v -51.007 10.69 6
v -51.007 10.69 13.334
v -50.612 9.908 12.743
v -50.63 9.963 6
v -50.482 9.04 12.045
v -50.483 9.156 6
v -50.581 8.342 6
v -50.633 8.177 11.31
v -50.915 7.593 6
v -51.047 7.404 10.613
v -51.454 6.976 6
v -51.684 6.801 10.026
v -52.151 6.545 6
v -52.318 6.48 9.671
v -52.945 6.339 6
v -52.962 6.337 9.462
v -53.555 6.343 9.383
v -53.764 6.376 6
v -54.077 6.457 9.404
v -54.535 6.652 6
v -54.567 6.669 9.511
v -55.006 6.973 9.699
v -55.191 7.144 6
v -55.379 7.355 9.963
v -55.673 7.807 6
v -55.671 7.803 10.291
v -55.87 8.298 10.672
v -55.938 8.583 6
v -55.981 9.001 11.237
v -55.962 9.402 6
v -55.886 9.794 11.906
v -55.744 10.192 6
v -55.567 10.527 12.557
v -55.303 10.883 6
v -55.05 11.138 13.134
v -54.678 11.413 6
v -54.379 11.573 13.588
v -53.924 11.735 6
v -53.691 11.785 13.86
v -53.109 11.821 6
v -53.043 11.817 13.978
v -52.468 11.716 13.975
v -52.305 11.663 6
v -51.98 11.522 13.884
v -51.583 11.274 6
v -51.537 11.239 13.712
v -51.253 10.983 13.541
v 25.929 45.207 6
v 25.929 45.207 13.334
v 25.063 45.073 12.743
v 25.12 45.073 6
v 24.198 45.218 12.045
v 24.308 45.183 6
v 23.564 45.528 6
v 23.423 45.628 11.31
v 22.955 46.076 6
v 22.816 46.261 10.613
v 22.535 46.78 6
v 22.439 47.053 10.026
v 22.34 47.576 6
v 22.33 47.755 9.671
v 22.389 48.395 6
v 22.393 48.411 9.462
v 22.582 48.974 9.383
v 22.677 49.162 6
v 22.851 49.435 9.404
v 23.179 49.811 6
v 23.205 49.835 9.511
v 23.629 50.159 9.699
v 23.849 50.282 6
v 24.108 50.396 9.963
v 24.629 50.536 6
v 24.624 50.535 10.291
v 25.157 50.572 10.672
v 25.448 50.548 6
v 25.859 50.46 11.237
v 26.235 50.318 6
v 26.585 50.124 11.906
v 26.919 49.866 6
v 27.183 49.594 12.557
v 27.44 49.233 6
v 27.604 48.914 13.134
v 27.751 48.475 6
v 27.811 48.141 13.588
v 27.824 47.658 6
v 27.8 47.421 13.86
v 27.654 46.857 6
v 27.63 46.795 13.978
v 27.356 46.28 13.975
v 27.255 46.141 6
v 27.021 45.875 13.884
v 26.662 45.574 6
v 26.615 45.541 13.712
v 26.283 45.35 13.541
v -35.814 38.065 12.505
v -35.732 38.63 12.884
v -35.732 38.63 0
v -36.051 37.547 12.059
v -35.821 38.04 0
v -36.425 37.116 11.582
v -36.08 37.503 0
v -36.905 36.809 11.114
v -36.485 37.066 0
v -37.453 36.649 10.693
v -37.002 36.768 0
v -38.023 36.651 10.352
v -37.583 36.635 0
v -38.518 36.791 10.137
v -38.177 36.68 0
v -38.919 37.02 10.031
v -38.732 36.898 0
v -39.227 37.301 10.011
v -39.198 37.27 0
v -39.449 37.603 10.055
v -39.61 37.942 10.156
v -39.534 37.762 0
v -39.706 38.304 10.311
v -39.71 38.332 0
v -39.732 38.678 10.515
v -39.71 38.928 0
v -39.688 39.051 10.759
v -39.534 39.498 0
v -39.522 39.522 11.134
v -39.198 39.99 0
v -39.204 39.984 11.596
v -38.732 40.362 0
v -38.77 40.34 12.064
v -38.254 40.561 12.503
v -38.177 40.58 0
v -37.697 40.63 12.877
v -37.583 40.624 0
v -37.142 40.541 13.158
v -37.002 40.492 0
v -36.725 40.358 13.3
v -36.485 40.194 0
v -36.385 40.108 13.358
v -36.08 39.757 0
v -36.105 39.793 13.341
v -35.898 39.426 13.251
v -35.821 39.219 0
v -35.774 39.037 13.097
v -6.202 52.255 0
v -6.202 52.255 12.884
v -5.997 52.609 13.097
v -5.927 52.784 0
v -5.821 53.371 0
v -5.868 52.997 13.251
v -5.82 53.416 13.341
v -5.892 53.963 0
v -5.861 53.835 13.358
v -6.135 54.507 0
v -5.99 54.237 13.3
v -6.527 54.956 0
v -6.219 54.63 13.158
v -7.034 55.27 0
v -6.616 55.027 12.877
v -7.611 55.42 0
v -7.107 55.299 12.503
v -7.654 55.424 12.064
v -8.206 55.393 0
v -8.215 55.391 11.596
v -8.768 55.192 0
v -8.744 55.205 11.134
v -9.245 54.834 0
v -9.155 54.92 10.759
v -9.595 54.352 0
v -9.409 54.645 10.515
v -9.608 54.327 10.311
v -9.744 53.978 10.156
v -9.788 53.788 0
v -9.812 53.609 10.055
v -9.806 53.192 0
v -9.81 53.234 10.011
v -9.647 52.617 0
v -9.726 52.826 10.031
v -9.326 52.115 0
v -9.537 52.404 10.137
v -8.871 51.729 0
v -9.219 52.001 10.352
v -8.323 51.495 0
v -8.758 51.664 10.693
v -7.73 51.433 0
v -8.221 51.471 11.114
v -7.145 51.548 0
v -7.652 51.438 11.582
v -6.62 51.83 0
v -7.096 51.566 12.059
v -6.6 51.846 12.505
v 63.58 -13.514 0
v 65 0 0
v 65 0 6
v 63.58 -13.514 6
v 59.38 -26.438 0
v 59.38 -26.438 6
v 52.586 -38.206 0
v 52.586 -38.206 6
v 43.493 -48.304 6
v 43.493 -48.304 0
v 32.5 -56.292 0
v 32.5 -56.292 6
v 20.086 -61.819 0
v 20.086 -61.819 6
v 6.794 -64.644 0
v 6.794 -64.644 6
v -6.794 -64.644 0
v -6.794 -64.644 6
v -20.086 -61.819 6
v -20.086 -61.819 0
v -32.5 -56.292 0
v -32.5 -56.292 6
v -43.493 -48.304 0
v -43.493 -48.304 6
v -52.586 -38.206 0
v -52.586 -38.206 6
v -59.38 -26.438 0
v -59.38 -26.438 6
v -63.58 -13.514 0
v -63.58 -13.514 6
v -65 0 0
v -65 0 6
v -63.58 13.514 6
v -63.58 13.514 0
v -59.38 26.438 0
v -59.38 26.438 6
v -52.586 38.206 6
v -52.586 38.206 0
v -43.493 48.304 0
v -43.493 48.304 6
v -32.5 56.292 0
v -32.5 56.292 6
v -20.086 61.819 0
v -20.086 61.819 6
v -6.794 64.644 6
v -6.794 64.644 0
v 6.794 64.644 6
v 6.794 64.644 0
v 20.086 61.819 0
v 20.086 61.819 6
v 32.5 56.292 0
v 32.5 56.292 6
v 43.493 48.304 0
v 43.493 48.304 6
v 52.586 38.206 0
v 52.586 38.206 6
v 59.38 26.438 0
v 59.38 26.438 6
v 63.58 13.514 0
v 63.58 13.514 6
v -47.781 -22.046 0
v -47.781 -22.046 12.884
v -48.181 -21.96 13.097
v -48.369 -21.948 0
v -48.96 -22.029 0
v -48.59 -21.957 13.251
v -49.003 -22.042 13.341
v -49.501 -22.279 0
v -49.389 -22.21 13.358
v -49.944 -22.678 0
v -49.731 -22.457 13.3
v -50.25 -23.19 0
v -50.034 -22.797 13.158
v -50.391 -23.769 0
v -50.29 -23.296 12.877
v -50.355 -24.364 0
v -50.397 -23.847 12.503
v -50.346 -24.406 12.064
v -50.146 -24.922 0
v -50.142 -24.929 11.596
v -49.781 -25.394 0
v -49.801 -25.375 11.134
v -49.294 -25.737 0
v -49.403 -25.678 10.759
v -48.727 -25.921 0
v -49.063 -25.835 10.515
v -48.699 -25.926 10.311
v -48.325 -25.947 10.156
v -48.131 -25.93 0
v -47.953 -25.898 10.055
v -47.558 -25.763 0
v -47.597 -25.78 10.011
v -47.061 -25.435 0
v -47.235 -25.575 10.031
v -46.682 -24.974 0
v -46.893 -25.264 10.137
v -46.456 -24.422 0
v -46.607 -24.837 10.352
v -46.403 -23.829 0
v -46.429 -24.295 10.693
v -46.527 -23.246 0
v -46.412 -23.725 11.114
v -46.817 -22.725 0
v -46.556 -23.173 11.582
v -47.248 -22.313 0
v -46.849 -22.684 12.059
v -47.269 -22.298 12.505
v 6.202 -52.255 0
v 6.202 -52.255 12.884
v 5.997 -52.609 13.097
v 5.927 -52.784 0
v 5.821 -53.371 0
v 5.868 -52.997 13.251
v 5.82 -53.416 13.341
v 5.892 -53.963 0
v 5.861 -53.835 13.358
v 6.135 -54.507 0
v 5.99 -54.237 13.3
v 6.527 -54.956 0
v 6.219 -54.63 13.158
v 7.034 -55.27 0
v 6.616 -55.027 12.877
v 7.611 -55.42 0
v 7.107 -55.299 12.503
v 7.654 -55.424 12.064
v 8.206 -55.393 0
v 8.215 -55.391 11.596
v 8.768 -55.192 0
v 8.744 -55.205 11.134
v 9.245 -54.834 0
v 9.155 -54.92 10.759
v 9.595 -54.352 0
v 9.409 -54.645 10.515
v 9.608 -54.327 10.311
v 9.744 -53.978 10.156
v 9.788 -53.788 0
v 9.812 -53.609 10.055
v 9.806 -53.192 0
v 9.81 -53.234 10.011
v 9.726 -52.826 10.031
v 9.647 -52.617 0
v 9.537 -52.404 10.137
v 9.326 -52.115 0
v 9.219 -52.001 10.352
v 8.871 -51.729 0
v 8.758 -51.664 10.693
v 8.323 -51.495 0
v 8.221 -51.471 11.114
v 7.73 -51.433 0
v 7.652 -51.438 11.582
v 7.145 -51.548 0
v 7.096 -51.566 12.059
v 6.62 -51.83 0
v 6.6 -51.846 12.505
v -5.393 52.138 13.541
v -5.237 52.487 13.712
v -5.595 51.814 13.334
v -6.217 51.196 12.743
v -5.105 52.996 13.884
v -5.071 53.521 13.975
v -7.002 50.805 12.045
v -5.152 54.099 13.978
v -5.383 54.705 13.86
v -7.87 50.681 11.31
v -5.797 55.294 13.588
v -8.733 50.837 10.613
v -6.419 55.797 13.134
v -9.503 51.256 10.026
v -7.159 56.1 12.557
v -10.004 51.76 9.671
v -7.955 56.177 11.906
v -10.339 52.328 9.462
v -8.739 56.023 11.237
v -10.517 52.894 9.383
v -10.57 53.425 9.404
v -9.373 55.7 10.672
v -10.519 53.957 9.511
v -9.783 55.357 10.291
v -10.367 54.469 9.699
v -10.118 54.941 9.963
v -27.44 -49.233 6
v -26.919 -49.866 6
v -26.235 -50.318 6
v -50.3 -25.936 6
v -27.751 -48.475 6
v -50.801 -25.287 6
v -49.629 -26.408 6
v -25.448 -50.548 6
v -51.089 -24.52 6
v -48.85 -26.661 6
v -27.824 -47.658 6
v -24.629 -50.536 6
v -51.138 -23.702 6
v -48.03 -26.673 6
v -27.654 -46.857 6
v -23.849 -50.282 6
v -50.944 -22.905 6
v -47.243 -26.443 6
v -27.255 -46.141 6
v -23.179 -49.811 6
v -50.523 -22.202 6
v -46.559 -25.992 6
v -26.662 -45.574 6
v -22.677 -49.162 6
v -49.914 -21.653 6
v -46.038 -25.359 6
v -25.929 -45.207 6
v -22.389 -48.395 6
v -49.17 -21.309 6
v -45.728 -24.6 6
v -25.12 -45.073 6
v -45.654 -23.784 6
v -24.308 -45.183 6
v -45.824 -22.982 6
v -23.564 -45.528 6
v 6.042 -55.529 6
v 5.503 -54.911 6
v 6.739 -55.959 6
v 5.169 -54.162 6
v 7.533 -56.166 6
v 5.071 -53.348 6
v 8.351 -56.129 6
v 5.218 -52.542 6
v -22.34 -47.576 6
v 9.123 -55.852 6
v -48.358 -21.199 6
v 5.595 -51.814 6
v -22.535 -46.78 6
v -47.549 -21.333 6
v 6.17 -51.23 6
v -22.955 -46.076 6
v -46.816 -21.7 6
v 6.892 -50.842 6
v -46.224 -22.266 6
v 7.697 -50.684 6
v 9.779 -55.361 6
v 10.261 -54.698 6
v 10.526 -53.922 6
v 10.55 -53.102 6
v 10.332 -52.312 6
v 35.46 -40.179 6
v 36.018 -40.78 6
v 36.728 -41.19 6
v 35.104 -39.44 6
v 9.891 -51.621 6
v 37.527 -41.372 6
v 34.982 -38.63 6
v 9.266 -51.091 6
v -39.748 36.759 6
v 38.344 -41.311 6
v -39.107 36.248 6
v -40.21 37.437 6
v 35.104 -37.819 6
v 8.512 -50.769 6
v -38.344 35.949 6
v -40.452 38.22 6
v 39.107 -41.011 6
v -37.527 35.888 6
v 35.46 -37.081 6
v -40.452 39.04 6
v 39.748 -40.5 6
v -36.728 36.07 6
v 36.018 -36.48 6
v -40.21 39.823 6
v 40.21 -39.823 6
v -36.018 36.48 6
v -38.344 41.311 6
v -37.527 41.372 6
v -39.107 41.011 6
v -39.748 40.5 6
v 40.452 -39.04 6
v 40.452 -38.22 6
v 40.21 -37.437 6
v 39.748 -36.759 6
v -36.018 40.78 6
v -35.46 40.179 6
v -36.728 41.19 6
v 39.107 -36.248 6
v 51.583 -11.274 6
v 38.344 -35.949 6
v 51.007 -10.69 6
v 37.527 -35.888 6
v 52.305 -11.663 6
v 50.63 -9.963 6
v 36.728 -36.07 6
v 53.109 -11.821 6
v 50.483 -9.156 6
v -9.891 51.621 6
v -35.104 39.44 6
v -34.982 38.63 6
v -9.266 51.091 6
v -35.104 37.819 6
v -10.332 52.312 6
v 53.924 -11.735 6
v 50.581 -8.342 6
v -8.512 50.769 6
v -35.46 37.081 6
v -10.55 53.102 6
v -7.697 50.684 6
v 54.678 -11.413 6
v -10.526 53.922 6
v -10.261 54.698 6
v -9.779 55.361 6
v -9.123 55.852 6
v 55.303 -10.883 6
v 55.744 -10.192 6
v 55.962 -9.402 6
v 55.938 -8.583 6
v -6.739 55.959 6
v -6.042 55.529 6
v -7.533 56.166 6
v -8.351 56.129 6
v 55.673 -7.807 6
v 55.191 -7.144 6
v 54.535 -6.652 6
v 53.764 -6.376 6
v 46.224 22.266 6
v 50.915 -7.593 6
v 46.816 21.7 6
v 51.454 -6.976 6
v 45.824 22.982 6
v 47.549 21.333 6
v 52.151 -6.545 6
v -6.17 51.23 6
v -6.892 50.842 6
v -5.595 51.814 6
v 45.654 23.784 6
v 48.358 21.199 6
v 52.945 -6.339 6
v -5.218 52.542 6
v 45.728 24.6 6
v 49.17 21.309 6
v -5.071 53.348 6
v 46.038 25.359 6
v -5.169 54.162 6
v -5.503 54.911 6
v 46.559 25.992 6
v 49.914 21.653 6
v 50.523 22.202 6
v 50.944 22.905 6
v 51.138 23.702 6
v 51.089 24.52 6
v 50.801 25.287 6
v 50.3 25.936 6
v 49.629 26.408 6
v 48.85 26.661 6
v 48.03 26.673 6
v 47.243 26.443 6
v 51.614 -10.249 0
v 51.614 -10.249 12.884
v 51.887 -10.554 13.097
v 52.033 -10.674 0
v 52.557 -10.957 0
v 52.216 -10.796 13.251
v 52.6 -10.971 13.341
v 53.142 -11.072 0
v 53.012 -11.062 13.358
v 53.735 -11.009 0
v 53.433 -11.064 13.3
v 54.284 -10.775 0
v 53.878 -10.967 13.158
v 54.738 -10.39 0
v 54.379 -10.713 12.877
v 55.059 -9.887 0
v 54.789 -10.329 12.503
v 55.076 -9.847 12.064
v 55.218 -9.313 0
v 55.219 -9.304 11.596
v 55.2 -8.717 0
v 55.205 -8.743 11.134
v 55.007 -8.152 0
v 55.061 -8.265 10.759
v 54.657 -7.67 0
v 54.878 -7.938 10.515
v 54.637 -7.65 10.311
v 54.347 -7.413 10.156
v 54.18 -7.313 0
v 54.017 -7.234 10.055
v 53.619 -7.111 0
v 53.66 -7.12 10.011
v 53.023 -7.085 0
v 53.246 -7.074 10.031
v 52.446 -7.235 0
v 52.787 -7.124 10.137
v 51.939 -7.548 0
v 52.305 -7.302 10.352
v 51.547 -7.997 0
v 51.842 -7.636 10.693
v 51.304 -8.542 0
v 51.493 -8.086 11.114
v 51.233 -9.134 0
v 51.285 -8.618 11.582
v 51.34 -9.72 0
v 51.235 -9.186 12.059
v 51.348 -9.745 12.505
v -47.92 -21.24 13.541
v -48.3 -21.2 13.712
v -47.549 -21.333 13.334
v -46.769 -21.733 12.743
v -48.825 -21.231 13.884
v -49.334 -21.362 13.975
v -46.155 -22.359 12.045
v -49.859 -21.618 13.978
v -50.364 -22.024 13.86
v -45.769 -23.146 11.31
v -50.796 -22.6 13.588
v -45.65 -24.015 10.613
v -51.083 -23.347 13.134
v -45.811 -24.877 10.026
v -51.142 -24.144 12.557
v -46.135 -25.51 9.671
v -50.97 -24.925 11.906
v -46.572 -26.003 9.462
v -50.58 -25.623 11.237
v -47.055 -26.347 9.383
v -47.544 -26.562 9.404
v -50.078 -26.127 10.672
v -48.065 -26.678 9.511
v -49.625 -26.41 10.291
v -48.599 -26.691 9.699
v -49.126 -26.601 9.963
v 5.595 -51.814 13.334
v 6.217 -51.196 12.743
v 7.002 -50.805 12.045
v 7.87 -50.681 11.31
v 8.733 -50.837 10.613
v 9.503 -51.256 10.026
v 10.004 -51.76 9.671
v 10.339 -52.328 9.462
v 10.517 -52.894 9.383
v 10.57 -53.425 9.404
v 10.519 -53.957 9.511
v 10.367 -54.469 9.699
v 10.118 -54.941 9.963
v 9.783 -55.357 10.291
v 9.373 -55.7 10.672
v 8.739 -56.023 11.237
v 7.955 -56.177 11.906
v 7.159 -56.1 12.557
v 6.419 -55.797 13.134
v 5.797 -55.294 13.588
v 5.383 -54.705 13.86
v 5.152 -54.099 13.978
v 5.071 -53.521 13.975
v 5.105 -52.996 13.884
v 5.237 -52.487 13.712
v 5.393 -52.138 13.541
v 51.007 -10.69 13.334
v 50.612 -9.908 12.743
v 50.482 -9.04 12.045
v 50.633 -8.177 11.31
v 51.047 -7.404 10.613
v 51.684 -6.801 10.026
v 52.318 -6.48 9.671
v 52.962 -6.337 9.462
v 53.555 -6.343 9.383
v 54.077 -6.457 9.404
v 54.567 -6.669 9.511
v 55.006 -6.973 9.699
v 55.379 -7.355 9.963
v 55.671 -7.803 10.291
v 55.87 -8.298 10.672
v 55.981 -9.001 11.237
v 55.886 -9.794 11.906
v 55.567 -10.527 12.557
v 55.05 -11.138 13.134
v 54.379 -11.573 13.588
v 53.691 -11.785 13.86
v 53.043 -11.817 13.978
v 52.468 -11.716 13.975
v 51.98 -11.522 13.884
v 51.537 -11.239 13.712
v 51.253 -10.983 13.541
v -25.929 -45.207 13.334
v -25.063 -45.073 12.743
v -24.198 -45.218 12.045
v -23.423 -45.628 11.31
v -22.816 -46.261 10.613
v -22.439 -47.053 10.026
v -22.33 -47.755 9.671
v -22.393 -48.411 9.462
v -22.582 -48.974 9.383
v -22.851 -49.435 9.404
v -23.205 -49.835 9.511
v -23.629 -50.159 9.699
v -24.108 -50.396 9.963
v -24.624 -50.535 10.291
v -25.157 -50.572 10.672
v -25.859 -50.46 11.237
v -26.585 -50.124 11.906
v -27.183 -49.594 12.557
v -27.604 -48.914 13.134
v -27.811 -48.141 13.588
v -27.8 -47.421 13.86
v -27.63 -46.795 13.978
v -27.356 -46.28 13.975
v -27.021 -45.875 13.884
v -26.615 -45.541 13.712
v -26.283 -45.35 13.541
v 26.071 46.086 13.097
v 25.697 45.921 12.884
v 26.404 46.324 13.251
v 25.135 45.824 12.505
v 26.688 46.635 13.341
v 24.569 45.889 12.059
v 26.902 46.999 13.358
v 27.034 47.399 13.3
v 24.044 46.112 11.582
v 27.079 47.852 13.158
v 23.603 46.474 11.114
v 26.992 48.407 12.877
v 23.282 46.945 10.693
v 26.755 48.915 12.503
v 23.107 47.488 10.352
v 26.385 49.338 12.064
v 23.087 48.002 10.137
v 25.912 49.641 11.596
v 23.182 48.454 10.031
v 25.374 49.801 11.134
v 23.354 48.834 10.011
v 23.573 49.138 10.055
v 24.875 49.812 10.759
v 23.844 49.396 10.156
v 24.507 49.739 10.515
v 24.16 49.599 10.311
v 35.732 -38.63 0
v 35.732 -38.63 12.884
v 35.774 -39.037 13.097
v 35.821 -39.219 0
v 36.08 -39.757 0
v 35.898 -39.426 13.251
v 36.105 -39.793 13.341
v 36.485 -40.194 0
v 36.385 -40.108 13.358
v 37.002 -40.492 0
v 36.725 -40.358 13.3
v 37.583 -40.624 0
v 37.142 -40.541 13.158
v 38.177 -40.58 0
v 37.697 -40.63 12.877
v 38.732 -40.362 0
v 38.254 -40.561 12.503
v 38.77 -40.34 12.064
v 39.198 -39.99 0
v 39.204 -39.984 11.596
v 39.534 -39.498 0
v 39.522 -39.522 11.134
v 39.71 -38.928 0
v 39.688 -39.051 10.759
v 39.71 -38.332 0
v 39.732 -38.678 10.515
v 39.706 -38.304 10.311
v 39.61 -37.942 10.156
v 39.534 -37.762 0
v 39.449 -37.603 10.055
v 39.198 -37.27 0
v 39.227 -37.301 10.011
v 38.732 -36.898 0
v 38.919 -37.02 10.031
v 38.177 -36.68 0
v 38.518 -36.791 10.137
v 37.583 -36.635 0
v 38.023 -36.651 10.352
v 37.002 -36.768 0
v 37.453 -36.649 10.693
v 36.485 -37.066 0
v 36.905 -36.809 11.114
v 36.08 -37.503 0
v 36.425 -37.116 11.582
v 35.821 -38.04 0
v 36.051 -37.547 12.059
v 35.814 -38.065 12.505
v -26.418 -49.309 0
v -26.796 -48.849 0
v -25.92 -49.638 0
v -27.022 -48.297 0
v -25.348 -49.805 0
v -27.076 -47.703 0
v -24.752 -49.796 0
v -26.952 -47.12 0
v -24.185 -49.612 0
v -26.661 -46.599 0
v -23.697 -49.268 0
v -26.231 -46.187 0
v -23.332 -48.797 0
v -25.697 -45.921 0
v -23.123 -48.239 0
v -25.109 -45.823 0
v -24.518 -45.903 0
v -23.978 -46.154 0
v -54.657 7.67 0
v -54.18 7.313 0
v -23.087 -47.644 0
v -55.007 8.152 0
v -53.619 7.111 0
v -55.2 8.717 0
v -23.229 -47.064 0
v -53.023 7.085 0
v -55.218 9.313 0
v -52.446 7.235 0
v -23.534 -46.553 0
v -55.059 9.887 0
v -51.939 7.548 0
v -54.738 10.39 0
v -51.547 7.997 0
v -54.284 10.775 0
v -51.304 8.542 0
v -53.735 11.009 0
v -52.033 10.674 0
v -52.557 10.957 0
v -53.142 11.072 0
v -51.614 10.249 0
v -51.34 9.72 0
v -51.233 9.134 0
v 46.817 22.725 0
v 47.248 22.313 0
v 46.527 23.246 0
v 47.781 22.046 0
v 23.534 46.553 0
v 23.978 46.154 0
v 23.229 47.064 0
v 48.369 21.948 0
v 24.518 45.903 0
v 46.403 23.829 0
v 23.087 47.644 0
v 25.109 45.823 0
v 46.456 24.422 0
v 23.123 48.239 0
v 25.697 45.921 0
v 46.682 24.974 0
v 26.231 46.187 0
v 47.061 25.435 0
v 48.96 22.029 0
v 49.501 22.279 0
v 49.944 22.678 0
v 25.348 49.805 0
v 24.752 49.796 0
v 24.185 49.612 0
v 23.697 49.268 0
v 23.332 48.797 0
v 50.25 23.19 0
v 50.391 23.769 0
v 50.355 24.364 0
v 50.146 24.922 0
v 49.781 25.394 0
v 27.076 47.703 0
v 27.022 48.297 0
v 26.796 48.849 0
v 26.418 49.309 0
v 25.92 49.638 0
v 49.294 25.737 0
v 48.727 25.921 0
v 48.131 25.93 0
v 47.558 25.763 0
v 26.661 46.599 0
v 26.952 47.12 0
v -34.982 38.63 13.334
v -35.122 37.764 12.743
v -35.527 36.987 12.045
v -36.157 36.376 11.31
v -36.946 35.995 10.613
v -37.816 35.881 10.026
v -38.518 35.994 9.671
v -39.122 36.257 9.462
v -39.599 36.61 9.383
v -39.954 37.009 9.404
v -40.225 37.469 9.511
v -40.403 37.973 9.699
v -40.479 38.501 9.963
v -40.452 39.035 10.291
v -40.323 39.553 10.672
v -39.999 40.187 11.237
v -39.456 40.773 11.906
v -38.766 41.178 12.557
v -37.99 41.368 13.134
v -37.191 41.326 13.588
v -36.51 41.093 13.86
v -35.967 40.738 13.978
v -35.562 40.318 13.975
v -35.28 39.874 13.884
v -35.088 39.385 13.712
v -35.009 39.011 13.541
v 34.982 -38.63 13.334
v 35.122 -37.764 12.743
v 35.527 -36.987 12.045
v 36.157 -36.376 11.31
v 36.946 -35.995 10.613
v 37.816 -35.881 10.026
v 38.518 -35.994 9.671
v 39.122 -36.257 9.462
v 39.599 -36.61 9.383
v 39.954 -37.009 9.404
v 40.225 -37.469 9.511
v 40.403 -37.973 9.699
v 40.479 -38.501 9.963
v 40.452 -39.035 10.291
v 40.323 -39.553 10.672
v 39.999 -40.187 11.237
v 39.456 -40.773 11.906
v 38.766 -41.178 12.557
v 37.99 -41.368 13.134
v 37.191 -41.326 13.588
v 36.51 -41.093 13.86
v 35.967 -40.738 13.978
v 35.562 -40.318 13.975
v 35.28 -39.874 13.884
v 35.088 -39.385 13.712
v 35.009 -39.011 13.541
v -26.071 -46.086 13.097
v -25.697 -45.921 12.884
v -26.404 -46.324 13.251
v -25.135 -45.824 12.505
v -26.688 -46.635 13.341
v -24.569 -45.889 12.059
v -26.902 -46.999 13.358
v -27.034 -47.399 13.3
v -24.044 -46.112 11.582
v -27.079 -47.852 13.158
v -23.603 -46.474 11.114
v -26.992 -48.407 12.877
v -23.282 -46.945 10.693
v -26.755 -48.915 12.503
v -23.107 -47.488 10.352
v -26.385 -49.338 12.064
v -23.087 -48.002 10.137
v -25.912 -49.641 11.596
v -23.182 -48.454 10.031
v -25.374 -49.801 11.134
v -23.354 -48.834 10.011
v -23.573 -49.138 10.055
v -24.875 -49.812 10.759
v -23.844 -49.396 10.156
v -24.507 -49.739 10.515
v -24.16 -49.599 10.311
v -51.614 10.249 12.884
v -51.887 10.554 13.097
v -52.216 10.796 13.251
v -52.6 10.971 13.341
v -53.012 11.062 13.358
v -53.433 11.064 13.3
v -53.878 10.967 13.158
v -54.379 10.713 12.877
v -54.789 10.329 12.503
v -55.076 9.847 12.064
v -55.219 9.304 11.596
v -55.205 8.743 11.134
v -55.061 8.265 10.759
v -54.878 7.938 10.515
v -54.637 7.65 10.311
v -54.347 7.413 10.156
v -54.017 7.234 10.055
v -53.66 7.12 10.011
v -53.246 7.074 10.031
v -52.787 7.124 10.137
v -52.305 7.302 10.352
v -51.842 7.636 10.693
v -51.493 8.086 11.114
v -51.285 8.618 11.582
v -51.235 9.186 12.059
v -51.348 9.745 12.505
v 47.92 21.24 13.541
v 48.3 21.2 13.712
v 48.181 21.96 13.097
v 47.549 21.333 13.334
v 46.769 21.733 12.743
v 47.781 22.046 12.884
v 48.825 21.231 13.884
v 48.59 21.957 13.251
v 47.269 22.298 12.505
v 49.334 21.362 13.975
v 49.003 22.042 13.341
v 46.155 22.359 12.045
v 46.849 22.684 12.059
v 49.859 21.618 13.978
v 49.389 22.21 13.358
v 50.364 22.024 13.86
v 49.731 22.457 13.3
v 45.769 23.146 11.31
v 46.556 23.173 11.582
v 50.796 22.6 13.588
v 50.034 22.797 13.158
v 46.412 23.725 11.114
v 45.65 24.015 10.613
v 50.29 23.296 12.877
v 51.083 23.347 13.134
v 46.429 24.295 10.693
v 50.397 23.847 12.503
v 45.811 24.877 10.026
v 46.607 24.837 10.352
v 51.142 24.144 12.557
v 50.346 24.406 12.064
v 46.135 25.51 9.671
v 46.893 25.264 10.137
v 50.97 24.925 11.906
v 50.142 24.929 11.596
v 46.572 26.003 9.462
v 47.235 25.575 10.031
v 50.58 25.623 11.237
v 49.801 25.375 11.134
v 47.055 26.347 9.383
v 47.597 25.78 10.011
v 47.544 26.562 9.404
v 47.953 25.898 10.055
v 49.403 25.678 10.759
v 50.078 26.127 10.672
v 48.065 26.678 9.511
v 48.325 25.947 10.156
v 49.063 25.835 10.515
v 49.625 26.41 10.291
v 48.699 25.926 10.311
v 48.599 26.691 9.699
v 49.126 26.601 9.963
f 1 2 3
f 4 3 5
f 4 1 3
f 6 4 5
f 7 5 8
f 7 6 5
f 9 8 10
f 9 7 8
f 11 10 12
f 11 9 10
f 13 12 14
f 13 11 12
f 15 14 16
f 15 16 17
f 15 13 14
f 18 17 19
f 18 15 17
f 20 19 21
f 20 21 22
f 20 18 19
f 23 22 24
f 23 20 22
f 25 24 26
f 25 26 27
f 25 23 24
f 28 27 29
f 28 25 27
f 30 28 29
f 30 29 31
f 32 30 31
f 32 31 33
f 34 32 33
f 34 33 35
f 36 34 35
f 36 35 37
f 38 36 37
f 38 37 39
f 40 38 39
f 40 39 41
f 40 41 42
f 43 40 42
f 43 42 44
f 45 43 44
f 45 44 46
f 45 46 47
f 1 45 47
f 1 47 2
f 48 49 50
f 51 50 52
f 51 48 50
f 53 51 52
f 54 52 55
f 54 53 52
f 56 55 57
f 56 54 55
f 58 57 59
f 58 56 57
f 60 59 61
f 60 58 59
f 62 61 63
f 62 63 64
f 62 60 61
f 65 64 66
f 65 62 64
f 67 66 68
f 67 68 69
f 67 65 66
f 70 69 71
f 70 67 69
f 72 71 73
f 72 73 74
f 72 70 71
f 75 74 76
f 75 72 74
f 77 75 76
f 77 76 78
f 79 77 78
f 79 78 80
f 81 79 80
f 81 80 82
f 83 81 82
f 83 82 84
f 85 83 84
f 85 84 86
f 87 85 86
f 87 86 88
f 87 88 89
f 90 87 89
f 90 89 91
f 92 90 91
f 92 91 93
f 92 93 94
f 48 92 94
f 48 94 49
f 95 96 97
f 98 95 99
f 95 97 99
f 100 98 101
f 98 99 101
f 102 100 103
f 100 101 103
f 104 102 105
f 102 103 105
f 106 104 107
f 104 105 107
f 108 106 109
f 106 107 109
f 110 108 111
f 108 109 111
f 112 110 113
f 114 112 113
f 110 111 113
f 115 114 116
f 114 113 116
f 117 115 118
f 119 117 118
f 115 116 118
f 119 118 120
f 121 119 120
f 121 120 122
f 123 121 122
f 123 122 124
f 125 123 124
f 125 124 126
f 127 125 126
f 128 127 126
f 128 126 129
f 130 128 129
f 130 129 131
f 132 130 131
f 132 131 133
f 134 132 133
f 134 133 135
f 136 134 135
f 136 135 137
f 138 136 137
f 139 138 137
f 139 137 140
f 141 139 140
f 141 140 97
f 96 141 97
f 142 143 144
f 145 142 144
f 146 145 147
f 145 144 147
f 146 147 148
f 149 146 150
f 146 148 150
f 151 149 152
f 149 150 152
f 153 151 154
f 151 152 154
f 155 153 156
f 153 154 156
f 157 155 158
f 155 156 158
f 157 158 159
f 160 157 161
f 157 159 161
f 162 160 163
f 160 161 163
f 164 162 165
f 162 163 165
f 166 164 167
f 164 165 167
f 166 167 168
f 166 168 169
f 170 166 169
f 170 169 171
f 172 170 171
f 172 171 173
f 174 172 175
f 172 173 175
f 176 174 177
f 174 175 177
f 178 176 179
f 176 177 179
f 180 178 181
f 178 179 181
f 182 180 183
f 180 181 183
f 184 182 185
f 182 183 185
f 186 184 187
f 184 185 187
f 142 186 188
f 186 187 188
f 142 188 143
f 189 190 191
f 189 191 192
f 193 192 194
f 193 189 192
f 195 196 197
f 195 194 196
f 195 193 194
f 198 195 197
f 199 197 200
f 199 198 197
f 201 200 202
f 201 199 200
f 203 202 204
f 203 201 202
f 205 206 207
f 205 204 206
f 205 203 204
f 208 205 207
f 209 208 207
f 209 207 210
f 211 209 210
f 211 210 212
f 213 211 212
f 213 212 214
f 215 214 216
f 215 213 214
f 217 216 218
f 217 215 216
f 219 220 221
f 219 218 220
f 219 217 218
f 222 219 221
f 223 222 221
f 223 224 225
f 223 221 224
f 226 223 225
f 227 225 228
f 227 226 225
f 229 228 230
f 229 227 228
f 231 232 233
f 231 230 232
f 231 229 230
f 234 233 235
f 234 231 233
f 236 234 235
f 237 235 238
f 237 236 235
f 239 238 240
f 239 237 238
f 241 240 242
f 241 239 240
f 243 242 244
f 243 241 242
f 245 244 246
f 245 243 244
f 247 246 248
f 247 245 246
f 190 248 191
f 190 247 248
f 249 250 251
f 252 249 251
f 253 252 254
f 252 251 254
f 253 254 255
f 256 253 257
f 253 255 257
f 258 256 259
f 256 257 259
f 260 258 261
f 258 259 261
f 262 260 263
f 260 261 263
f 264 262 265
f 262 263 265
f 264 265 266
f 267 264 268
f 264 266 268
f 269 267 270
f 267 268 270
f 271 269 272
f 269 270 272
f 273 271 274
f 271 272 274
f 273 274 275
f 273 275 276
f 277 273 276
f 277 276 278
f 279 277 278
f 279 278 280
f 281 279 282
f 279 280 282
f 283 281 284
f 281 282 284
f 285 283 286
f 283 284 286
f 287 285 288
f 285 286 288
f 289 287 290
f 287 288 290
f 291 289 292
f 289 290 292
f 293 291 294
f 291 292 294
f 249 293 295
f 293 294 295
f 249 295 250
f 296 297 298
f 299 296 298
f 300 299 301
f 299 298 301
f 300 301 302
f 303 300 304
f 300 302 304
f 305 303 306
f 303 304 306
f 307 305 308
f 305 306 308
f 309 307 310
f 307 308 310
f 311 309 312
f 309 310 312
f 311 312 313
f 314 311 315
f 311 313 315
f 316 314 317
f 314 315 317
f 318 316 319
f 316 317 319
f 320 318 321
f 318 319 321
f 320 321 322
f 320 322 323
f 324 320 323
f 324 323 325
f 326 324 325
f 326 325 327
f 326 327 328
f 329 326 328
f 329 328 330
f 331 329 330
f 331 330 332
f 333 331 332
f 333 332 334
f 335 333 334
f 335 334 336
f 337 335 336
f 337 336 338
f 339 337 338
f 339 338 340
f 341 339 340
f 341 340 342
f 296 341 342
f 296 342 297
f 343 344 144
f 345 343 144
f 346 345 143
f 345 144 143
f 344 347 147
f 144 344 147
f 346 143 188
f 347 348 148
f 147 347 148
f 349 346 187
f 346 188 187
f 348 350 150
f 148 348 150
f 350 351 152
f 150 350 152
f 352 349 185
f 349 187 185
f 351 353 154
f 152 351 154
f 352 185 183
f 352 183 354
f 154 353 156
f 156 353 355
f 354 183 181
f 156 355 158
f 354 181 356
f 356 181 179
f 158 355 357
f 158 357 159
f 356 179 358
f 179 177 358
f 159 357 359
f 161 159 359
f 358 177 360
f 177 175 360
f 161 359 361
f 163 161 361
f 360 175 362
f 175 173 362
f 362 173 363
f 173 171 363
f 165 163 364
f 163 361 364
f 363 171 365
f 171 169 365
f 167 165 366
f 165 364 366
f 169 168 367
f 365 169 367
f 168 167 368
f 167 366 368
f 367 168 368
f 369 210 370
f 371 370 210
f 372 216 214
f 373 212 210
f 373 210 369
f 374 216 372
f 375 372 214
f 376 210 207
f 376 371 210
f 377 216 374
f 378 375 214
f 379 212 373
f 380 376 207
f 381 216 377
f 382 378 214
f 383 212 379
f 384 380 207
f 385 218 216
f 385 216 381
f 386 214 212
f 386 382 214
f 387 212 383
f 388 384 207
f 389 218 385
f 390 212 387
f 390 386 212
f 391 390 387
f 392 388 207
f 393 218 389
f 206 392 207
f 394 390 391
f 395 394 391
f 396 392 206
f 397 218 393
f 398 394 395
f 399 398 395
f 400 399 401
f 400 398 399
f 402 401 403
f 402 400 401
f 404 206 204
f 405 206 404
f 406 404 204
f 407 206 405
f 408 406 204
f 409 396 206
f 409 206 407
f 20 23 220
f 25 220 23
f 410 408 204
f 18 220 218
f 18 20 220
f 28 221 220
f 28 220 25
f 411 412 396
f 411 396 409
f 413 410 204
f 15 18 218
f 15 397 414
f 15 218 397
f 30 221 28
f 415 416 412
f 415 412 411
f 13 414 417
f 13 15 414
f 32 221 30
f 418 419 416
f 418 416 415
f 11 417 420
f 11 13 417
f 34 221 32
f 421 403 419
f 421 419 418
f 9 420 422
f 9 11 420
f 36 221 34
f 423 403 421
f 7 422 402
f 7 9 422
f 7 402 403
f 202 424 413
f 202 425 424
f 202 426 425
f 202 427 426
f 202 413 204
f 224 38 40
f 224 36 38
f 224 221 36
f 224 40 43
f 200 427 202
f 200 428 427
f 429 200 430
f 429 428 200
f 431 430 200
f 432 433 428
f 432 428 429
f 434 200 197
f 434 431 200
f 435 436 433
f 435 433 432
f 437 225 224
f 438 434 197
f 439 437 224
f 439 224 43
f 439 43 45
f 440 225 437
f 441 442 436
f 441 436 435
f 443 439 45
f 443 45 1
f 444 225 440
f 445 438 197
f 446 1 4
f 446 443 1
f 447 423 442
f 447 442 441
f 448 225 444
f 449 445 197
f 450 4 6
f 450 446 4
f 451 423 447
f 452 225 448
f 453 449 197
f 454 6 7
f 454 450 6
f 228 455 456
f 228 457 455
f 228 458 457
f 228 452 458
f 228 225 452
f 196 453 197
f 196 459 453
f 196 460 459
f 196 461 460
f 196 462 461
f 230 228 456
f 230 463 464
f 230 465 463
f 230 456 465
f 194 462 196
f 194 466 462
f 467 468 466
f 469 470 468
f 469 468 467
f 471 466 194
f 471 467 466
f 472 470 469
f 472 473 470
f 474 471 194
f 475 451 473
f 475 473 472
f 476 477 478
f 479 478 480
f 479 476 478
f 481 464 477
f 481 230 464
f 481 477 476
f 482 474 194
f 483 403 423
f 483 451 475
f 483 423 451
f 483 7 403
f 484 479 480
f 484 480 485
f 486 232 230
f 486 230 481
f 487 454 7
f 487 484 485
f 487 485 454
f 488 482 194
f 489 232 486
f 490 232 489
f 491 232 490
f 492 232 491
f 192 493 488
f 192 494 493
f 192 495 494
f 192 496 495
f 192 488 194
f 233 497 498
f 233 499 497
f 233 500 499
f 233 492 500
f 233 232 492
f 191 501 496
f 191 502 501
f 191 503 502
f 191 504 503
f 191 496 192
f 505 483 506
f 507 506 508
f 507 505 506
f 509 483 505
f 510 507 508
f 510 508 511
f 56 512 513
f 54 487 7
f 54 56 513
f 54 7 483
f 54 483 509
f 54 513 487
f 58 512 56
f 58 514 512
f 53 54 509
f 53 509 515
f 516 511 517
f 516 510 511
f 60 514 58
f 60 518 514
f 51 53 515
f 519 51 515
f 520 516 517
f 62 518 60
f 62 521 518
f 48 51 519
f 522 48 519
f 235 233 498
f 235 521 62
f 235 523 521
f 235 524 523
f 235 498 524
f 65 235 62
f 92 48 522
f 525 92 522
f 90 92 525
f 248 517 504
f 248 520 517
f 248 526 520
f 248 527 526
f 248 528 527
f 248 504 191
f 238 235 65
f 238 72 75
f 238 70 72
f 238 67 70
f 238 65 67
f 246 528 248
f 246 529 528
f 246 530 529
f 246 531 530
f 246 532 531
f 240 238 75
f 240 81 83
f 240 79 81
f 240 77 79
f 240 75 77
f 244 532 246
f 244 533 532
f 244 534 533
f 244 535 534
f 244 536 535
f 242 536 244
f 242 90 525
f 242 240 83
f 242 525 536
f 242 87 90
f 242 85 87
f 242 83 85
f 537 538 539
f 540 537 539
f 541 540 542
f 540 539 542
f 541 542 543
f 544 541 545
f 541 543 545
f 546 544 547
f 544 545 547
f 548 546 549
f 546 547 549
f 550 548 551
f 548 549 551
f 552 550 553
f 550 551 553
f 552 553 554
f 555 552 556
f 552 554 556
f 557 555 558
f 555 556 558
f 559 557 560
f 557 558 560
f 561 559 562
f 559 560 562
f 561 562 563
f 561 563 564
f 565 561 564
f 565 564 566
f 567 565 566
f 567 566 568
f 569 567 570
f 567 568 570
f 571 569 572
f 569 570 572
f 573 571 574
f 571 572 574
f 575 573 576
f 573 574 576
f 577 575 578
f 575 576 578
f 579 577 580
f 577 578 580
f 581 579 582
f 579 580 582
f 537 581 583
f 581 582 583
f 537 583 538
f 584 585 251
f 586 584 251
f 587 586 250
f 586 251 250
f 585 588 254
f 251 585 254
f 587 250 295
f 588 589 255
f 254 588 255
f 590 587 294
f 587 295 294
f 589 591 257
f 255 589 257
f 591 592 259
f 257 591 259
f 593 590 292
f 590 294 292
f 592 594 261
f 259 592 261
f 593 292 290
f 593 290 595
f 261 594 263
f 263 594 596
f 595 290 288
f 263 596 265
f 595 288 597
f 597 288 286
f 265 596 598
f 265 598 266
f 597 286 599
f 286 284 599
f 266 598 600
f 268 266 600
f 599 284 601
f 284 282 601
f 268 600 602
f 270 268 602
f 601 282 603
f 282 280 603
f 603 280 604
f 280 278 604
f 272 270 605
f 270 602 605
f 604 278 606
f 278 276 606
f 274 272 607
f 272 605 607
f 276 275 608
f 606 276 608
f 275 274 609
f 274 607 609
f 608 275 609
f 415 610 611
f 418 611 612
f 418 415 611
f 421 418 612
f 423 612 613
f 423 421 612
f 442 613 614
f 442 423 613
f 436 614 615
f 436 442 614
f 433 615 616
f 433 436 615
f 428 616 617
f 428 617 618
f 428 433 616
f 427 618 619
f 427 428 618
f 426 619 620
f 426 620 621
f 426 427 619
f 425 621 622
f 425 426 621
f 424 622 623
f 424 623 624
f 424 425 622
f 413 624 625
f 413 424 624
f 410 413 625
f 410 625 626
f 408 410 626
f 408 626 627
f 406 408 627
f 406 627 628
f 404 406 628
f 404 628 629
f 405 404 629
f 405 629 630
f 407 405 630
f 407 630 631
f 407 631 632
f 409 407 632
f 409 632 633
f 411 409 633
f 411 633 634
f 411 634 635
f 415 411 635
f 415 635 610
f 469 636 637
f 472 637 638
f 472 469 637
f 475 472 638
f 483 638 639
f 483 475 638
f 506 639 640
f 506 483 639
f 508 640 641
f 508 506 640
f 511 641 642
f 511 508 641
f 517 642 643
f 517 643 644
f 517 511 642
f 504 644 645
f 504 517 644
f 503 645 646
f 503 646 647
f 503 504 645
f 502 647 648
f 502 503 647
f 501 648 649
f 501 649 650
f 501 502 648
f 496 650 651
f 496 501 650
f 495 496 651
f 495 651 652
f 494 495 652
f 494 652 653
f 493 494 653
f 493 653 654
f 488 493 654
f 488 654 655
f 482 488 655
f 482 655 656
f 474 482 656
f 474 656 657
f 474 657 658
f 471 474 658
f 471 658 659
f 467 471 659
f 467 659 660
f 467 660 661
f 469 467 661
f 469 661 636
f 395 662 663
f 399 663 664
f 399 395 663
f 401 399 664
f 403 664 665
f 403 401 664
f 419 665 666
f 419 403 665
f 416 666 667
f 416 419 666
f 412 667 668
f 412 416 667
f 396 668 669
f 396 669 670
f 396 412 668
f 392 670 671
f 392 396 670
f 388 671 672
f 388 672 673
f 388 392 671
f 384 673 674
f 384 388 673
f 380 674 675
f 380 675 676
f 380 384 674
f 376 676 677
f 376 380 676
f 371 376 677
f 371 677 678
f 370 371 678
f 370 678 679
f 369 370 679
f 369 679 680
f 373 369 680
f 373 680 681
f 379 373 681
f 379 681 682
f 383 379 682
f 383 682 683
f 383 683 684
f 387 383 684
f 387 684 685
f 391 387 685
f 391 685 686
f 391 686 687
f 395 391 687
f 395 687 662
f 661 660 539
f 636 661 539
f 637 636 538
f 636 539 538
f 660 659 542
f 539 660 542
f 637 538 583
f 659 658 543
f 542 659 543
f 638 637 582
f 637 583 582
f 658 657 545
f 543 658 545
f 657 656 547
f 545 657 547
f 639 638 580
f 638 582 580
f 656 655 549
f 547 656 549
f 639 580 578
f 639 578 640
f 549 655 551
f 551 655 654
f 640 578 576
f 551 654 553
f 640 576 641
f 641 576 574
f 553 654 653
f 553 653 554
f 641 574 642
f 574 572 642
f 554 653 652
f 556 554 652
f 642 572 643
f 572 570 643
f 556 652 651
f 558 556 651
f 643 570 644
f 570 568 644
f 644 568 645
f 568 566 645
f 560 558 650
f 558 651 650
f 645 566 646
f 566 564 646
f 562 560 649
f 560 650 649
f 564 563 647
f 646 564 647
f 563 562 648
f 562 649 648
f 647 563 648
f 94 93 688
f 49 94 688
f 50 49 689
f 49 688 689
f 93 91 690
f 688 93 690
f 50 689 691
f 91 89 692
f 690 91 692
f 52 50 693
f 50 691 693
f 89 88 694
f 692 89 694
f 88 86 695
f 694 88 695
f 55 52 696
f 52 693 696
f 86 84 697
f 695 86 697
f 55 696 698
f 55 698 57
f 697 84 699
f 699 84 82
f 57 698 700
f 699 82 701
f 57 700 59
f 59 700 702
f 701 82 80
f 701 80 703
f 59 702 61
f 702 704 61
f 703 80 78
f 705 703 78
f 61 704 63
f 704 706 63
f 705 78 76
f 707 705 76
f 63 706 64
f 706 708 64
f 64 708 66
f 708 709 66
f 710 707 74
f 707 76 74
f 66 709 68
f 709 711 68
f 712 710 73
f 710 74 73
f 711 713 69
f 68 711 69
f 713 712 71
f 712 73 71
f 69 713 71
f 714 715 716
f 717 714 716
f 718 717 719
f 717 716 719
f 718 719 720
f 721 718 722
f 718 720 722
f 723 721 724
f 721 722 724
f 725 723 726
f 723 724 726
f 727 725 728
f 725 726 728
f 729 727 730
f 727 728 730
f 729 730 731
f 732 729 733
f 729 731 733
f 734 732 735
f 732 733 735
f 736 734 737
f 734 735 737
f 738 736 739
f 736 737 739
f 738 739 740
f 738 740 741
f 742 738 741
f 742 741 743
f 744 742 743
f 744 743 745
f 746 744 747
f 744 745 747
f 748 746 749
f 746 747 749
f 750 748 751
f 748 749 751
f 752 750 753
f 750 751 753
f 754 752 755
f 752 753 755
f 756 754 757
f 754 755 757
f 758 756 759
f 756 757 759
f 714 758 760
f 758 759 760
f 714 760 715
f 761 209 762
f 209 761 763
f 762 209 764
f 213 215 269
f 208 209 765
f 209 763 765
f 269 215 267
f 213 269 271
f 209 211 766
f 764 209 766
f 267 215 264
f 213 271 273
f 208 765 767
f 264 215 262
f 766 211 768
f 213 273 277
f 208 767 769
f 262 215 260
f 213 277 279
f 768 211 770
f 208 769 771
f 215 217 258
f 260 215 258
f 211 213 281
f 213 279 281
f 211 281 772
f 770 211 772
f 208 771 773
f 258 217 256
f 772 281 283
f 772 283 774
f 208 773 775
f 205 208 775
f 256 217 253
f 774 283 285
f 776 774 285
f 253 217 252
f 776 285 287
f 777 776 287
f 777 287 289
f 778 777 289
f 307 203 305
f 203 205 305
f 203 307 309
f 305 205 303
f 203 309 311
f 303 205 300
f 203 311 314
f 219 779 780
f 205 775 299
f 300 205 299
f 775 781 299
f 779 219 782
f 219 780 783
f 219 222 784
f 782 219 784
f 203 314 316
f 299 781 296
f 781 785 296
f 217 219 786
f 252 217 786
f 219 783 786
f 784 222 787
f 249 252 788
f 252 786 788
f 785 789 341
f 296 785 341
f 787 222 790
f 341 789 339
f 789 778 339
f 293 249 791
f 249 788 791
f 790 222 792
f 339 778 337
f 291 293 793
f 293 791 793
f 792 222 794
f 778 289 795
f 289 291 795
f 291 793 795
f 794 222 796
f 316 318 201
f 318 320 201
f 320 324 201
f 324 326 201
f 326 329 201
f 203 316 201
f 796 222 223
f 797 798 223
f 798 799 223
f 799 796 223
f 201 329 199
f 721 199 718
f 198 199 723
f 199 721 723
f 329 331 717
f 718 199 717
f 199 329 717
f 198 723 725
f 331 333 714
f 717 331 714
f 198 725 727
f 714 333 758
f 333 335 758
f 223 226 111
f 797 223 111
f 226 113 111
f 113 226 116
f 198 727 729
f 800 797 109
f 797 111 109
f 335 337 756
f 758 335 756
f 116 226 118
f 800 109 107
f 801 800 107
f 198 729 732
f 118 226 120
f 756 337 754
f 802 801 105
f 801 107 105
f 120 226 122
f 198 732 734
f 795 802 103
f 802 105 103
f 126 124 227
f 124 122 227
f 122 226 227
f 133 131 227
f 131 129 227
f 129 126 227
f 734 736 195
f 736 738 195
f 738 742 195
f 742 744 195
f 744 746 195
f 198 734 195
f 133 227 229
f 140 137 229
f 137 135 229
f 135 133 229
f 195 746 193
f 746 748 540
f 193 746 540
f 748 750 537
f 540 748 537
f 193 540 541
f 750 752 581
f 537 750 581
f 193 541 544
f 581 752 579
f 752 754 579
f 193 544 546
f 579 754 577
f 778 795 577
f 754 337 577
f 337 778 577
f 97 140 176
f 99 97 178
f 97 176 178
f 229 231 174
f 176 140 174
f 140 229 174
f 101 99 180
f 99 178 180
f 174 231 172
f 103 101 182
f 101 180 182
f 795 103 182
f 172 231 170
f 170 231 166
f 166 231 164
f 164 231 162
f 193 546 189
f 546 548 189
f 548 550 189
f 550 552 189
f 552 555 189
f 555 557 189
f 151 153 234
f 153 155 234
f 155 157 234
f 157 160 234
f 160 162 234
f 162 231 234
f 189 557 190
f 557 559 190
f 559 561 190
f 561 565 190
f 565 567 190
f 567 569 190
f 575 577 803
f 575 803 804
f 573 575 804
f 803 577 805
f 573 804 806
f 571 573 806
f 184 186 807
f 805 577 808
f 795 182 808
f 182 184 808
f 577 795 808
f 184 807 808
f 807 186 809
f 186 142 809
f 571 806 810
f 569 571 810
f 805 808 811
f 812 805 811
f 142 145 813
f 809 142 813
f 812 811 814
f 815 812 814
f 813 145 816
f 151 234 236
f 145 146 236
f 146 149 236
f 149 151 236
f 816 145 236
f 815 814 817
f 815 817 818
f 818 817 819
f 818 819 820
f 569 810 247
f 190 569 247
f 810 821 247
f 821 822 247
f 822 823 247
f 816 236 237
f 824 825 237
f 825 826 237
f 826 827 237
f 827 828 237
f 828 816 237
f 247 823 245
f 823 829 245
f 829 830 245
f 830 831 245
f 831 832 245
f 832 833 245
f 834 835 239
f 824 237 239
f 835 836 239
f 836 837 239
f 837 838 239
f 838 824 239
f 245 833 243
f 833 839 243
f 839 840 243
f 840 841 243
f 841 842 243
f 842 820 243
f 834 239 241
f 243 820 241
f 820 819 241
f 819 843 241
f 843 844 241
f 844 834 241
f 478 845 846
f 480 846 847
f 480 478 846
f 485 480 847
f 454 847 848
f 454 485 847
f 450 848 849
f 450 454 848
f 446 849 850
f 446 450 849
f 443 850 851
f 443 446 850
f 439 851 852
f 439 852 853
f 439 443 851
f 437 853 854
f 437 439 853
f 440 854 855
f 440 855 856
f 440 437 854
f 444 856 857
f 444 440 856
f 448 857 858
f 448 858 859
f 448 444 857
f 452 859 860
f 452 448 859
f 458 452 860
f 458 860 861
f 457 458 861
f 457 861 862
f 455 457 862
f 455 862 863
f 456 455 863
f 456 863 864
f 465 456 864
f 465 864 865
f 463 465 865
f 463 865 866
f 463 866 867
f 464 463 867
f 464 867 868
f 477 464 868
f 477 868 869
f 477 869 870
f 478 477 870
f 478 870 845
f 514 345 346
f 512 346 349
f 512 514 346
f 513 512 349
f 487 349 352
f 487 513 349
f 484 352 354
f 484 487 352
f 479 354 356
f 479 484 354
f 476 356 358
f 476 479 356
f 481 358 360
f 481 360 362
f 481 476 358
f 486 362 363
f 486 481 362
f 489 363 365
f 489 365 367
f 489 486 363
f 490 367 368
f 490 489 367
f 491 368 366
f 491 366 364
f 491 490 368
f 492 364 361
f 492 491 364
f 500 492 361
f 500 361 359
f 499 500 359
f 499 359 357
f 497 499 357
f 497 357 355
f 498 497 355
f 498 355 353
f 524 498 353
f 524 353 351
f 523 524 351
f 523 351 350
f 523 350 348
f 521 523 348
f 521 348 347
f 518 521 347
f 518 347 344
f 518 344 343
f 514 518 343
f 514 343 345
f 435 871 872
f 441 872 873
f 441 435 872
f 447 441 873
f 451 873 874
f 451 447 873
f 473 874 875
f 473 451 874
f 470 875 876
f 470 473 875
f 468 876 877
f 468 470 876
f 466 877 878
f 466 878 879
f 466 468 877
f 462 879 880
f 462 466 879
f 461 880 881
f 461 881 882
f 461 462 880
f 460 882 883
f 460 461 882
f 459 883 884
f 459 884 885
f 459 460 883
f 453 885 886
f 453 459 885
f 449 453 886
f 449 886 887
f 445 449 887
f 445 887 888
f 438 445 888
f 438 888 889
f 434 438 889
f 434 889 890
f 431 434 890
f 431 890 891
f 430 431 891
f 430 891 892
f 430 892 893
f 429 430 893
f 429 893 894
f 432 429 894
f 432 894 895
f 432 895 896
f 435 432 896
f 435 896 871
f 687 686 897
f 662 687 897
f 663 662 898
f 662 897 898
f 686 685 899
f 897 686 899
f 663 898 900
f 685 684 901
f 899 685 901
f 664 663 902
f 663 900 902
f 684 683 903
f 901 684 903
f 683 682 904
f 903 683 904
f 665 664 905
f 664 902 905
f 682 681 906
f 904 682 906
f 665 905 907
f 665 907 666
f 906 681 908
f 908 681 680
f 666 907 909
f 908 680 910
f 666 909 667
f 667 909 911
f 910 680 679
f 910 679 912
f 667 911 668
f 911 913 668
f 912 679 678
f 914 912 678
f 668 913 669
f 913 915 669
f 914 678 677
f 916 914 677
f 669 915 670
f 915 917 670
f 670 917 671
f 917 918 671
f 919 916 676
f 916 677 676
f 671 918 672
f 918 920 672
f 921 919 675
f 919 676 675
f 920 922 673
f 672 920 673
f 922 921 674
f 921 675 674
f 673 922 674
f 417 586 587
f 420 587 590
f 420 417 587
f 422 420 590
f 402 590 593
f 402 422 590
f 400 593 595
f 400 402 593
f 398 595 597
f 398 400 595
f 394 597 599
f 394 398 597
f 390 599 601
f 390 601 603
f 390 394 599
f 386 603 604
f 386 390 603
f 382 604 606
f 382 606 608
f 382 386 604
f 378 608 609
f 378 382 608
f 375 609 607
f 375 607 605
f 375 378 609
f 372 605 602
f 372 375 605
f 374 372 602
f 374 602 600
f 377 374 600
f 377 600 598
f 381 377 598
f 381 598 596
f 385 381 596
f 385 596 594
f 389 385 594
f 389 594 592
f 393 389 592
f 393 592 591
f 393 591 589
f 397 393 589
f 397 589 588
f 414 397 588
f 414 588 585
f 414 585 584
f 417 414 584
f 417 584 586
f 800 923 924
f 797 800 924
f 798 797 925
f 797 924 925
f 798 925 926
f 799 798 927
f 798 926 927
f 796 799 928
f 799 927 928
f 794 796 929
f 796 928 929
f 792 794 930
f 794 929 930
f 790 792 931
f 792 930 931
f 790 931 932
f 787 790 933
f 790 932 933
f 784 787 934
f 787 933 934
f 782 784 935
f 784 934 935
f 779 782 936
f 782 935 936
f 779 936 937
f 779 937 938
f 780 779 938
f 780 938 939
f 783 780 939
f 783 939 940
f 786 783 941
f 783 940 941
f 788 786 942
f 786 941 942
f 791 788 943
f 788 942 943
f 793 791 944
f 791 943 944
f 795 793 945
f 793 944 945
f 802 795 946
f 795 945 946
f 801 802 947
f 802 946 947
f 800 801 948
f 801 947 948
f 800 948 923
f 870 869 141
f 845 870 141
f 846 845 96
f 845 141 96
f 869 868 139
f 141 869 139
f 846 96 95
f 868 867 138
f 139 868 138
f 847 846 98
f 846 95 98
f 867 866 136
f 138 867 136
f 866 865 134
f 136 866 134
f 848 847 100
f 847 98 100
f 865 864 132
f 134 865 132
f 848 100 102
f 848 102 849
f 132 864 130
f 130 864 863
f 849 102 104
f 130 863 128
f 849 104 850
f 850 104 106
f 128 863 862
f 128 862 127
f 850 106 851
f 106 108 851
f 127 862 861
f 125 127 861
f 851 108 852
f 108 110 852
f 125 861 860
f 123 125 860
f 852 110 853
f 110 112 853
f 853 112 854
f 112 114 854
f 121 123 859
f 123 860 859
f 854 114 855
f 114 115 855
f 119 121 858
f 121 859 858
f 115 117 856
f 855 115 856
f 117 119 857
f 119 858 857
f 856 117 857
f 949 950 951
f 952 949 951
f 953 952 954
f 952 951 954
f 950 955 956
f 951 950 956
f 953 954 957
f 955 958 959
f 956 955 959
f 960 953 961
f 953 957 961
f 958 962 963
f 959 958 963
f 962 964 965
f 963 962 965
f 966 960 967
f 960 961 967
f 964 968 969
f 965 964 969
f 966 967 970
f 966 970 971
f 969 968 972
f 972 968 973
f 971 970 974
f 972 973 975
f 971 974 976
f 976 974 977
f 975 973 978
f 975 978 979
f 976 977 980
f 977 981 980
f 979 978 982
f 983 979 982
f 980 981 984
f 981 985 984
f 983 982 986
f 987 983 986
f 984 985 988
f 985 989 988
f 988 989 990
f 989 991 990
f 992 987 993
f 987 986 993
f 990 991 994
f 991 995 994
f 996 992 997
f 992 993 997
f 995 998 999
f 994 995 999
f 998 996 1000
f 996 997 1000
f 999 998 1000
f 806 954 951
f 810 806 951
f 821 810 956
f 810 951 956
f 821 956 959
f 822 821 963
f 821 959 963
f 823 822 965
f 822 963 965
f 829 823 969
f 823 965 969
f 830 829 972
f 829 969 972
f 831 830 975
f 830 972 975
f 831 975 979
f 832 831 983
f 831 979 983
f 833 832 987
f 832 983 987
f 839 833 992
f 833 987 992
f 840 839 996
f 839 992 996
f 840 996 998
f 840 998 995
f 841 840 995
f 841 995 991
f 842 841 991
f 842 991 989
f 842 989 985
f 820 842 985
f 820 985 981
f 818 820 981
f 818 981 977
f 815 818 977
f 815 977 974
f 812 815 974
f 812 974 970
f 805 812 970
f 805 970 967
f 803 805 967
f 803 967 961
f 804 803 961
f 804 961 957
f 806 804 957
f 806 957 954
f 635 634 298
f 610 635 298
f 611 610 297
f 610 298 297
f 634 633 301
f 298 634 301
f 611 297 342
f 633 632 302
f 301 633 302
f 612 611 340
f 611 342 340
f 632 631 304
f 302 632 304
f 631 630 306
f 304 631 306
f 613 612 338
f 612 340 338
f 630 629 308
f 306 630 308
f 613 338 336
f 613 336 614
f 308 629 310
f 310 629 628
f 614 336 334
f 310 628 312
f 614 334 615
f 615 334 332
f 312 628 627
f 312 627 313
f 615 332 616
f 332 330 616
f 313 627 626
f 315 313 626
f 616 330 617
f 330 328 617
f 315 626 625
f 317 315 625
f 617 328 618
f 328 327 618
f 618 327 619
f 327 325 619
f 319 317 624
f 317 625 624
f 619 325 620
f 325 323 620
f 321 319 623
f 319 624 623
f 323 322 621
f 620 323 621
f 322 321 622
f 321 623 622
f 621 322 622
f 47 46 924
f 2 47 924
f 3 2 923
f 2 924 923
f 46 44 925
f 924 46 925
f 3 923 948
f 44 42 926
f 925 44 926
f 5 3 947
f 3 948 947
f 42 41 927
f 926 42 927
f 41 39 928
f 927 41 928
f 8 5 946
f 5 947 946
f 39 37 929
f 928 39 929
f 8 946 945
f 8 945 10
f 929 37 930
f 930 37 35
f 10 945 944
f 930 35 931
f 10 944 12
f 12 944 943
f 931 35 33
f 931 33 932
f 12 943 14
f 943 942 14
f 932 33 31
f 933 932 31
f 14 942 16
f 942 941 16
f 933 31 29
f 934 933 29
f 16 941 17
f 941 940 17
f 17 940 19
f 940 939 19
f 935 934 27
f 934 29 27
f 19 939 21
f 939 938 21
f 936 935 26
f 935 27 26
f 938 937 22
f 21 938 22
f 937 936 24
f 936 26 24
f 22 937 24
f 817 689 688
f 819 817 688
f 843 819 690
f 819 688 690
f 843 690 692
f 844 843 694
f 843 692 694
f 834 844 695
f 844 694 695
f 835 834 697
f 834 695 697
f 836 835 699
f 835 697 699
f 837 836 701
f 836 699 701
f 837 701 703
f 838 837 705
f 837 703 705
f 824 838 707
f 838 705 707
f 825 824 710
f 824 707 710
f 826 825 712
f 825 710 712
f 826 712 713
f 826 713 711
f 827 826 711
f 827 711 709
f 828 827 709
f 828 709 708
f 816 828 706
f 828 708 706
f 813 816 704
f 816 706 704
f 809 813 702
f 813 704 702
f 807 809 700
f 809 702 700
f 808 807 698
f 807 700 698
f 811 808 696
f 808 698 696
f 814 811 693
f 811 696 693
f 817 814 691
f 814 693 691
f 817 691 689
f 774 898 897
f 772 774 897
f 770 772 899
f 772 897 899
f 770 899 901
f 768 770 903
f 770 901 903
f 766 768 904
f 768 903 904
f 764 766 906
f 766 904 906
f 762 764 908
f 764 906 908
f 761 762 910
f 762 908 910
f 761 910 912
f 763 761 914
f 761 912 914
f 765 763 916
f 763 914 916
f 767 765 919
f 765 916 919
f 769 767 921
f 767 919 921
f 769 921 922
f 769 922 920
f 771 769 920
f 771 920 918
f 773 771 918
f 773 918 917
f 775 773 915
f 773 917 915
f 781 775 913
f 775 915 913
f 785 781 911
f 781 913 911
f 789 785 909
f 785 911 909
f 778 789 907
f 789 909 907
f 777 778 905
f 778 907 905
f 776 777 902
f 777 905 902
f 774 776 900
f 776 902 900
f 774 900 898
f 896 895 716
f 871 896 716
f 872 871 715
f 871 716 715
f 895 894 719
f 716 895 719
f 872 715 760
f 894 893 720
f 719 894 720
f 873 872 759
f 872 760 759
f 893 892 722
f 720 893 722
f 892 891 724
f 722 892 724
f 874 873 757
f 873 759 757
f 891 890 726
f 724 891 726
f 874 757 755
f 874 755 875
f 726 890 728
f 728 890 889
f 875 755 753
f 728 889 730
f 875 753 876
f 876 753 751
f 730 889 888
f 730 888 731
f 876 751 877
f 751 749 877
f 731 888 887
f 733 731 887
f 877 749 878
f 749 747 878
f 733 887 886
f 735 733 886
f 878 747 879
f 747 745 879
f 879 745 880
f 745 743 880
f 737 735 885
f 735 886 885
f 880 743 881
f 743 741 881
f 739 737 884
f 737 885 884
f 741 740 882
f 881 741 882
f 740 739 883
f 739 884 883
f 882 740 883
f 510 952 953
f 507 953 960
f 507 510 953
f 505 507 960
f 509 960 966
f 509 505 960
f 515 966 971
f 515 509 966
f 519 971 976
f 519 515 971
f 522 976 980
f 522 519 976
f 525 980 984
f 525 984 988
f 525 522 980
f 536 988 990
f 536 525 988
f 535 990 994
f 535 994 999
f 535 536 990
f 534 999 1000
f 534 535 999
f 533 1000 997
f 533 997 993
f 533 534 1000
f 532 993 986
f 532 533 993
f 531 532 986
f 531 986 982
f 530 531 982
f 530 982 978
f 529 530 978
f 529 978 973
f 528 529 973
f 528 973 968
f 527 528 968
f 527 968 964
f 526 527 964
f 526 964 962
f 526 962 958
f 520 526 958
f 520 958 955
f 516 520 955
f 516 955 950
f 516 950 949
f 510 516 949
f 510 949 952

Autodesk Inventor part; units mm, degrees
ref_plane "YZ Plane" through (0, 0, 0) normal (1, 0, 0) x (0, 1, 0)
ref_plane "XZ Plane" through (0, 0, 0) normal (0, 1, 0) x (-1, 0, 0)
ref_plane "XY Plane" through (0, 0, 0) normal (0, 0, 1) x (1, 0, 0)
sketch "Sketch14" plane through (0, 0, 0) normal (0, 0, 1) x (1, 0, 0)
  circle A0 centre (0, 0) radius 65
  dimension "d67" = 130
extrude "Extrusion10" add sketch "Sketch14" along normal blind 6
sketch "Sketch15" plane through (0, 0, 6) normal (0, 0, 1) x (1, 0, 0)
  circle A0 centre (-37.7323, 38.6299) radius 2
  line L0 (-37.7323, 38.6299) -> (0, 0) construction
  circle A1 centre (0, 0) radius 65 projected
  line L1 (0, 0) -> (-55.3564, 56.6733) construction
  line L2 (-55.3564, 56.6733) -> (-63.1164, 49.0935) construction
  dimension "d70" = 54
  dimension "d75" = 4
extrude "Extrusion11" cut sketch "Sketch15" against normal blind 6 contours A0
sketch "Sketch16" plane through (0, 0, 6) normal (0, 0, 1) x (1, 0, 0)
  circle A0 centre (-37.7323, 38.6299) radius 2.75
  circle A1 centre (-37.7323, 38.6299) radius 2 projected
  point P0 (0, 0)
  dimension "d73" = 5.5
extrude "Extrusion12" add sketch "Sketch16" along normal blind 8
sketch "Sketch17" plane through (0, 0, 6) normal (0, 0, 1) x (1, 0, 0)
  circle A0 centre (-37.7323, 38.6299) radius 2.75 projected
  circle A1 centre (-37.7323, 38.6299) radius 2 construction
  line L0 (-37.7323, 38.6299) -> (0, 0) construction
  line L1 (-37.7323, 38.6299) -> (-45.4185, 46.499) construction
  circle A2 centre (0, 0) radius 65 construction
  dimension "d79" = 130
ref_plane "Work Plane18" through (-45.4185, 46.499, 6) normal (-0.6987, 0.7154, 0) x (-0.7154, -0.6987, 0)
sketch "Sketch18" plane through (-45.4185, 46.499, 6) normal (-0.6987, 0.7154, 0) x (-0.7154, -0.6987, 0)
  line L0 (-2.7631, 8) -> (2.8739, 3.2761)
  line L1 (2.8739, 3.2761) -> (2.8739, 8)
  line L2 (2.8739, 8) -> (-2.7631, 8)
  point P0 (0, -6)
extrude "Extrusion13" cut sketch "Sketch18" against normal blind 15
pattern_circular "Circular Pattern2" count 10 over 360 about axis through (0, 0, 6) along (0, 0, 1) of "Extrusion12", "Extrusion13", "Extrusion11"
properties part number "inner bayonet connector 10"
